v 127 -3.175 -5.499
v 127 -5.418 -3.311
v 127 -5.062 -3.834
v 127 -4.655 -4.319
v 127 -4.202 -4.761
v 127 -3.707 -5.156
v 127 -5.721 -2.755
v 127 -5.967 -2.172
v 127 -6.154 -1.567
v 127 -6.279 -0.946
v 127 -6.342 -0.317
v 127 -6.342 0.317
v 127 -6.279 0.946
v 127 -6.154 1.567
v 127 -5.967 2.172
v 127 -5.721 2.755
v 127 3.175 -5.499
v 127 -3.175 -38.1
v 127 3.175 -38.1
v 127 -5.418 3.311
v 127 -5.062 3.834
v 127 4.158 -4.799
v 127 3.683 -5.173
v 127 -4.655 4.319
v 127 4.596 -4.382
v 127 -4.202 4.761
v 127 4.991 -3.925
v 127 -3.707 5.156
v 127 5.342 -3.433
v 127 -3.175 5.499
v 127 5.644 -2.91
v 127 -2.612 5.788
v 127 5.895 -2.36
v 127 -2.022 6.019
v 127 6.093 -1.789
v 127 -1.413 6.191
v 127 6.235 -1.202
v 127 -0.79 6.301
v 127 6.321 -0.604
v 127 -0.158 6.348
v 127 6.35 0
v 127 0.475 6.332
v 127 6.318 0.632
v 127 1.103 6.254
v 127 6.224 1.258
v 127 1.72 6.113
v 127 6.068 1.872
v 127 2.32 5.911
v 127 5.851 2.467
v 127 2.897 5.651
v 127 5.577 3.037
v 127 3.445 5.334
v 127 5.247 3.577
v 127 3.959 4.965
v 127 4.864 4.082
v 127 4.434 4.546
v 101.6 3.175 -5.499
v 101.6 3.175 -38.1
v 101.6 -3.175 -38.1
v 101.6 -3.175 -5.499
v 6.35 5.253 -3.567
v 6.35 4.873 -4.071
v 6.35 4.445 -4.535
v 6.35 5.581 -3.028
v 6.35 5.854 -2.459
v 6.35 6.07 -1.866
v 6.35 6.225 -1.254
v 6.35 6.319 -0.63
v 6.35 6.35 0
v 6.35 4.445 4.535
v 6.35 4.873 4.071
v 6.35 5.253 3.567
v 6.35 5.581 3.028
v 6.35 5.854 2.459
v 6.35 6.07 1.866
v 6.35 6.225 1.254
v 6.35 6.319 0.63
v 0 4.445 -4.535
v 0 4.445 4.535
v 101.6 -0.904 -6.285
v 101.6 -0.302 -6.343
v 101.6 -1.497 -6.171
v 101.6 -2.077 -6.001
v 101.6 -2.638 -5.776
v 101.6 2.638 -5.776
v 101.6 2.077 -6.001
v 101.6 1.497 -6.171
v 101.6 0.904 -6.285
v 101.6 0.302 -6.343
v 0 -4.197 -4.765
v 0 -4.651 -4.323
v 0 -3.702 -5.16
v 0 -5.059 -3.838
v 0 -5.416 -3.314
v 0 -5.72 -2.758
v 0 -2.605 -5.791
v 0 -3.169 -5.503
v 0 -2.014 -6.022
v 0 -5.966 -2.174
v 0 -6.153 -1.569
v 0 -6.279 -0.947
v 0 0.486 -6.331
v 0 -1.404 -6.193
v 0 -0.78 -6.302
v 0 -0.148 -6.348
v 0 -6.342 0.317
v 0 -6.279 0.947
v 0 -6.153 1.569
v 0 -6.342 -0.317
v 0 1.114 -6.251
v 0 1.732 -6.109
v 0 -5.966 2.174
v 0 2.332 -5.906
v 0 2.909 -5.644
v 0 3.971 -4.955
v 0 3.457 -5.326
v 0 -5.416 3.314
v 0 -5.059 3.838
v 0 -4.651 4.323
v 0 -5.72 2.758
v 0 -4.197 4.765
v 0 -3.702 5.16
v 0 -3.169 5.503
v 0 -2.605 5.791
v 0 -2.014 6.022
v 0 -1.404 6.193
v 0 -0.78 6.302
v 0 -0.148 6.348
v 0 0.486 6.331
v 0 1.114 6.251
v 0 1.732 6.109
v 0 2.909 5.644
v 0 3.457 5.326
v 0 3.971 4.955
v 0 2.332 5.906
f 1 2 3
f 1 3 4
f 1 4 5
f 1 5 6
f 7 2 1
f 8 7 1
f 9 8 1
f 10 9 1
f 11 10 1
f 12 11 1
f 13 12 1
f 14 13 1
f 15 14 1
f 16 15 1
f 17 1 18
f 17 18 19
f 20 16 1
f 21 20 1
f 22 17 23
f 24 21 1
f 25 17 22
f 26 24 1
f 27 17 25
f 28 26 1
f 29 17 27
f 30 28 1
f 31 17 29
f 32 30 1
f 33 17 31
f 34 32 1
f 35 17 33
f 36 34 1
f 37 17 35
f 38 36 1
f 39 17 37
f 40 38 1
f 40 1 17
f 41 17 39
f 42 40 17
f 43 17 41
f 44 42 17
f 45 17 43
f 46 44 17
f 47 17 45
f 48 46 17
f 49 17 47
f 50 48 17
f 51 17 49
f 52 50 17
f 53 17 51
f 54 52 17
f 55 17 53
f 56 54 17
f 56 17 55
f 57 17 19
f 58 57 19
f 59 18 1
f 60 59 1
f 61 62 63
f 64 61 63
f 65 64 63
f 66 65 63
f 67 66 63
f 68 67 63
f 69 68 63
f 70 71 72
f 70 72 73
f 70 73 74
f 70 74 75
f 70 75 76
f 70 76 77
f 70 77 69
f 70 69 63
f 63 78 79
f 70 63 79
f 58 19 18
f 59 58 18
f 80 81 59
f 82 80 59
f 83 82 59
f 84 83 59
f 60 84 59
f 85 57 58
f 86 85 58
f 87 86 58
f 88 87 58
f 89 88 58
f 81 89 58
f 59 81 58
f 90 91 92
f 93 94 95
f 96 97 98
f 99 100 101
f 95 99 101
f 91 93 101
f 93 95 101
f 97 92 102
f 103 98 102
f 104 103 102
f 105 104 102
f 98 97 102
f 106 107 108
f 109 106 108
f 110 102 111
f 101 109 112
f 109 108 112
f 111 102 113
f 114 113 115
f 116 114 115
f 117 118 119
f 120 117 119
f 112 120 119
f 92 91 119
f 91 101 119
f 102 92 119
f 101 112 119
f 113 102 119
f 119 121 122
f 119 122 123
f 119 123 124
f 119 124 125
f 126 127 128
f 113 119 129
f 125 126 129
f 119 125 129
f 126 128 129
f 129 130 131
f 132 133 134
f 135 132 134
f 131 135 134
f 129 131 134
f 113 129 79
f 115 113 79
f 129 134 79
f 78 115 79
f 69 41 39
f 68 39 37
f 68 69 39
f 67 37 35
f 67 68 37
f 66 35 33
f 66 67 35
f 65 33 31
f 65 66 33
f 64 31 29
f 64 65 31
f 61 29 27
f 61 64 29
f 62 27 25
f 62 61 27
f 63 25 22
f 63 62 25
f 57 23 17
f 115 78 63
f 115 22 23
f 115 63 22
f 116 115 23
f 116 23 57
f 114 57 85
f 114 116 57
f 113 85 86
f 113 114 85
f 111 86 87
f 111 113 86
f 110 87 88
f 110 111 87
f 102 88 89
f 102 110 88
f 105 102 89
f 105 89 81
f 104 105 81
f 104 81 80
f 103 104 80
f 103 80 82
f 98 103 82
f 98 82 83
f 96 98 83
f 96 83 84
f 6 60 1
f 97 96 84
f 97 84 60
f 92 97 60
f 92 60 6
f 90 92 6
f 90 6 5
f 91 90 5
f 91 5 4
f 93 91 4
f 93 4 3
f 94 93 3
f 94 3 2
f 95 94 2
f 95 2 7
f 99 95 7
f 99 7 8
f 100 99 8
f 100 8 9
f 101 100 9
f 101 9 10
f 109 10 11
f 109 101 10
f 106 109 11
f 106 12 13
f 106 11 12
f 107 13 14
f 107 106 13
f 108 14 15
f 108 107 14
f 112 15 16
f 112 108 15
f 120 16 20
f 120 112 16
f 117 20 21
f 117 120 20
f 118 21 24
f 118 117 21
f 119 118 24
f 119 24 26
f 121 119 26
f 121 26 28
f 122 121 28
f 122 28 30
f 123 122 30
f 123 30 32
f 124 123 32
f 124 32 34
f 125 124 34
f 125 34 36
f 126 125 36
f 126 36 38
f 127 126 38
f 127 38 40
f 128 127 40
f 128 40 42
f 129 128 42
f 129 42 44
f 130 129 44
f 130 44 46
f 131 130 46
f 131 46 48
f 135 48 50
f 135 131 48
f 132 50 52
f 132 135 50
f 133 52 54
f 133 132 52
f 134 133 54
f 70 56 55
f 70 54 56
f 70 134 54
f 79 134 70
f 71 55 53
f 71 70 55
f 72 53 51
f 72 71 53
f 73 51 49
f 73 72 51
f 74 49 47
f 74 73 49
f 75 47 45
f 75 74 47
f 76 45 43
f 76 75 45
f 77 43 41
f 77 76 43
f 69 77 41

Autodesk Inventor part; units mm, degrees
ref_plane "YZ Plane" through (0, 0, 0) normal (1, 0, 0) x (0, 1, 0)
ref_plane "XZ Plane" through (0, 0, 0) normal (0, 1, 0) x (-1, 0, 0)
ref_plane "XY Plane" through (0, 0, 0) normal (0, 0, 1) x (1, 0, 0)
sketch "Sketch1" plane through (0, 0, 0) normal (1, 0, 0) x (0, 1, 0)
  circle A0 centre (0, 0) radius 6.35
  dimension "d0" = 12.7
extrude "Extrusion1" add sketch "Sketch1" along normal blind 127
sketch "Sketch2" plane through (127, 0, 0) normal (1, 0, 0) x (0, 0, -1)
  circle A0 centre (0, 0) radius 6.35 projected
  line L0 (0, 3.175) -> (38.1, 3.175)
  line L1 (38.1, 3.175) -> (38.1, -3.175)
  line L2 (38.1, -3.175) -> (0, -3.175)
  line L3 (0, -3.175) -> (0, 3.175)
  dimension "d3" = 12.7
  dimension "d4" = 6.35
  dimension "d5" = 3.175
  dimension "d6" = 38.1
  dimension "d7" = 0
extrude "Extrusion2" add sketch "Sketch2" against normal blind 25.4 contours A0 L2 L3 L0 | A0 L0 L1 L2 picked at (2.1167, 0)
sketch "Sketch3" plane through (0, 0, 0) normal (-1, 0, 0) x (0, 0, 1)
  circle A0 centre (0, 0) radius 6.35 projected
  circle A1 centre (0, 0) radius 6.35 projected
  line L0 (-4.5348, 4.445) -> (4.5348, 4.445)
  line L1 (-5.4993, 3.175) -> (-38.1, 3.175) projected
  dimension "d10" = 4.445
extrude "Extrusion3" cut sketch "Sketch3" against normal blind 6.35 contours L0 A0 picked at (-0.24, 5.0664)
properties part number "StressTestPart"
